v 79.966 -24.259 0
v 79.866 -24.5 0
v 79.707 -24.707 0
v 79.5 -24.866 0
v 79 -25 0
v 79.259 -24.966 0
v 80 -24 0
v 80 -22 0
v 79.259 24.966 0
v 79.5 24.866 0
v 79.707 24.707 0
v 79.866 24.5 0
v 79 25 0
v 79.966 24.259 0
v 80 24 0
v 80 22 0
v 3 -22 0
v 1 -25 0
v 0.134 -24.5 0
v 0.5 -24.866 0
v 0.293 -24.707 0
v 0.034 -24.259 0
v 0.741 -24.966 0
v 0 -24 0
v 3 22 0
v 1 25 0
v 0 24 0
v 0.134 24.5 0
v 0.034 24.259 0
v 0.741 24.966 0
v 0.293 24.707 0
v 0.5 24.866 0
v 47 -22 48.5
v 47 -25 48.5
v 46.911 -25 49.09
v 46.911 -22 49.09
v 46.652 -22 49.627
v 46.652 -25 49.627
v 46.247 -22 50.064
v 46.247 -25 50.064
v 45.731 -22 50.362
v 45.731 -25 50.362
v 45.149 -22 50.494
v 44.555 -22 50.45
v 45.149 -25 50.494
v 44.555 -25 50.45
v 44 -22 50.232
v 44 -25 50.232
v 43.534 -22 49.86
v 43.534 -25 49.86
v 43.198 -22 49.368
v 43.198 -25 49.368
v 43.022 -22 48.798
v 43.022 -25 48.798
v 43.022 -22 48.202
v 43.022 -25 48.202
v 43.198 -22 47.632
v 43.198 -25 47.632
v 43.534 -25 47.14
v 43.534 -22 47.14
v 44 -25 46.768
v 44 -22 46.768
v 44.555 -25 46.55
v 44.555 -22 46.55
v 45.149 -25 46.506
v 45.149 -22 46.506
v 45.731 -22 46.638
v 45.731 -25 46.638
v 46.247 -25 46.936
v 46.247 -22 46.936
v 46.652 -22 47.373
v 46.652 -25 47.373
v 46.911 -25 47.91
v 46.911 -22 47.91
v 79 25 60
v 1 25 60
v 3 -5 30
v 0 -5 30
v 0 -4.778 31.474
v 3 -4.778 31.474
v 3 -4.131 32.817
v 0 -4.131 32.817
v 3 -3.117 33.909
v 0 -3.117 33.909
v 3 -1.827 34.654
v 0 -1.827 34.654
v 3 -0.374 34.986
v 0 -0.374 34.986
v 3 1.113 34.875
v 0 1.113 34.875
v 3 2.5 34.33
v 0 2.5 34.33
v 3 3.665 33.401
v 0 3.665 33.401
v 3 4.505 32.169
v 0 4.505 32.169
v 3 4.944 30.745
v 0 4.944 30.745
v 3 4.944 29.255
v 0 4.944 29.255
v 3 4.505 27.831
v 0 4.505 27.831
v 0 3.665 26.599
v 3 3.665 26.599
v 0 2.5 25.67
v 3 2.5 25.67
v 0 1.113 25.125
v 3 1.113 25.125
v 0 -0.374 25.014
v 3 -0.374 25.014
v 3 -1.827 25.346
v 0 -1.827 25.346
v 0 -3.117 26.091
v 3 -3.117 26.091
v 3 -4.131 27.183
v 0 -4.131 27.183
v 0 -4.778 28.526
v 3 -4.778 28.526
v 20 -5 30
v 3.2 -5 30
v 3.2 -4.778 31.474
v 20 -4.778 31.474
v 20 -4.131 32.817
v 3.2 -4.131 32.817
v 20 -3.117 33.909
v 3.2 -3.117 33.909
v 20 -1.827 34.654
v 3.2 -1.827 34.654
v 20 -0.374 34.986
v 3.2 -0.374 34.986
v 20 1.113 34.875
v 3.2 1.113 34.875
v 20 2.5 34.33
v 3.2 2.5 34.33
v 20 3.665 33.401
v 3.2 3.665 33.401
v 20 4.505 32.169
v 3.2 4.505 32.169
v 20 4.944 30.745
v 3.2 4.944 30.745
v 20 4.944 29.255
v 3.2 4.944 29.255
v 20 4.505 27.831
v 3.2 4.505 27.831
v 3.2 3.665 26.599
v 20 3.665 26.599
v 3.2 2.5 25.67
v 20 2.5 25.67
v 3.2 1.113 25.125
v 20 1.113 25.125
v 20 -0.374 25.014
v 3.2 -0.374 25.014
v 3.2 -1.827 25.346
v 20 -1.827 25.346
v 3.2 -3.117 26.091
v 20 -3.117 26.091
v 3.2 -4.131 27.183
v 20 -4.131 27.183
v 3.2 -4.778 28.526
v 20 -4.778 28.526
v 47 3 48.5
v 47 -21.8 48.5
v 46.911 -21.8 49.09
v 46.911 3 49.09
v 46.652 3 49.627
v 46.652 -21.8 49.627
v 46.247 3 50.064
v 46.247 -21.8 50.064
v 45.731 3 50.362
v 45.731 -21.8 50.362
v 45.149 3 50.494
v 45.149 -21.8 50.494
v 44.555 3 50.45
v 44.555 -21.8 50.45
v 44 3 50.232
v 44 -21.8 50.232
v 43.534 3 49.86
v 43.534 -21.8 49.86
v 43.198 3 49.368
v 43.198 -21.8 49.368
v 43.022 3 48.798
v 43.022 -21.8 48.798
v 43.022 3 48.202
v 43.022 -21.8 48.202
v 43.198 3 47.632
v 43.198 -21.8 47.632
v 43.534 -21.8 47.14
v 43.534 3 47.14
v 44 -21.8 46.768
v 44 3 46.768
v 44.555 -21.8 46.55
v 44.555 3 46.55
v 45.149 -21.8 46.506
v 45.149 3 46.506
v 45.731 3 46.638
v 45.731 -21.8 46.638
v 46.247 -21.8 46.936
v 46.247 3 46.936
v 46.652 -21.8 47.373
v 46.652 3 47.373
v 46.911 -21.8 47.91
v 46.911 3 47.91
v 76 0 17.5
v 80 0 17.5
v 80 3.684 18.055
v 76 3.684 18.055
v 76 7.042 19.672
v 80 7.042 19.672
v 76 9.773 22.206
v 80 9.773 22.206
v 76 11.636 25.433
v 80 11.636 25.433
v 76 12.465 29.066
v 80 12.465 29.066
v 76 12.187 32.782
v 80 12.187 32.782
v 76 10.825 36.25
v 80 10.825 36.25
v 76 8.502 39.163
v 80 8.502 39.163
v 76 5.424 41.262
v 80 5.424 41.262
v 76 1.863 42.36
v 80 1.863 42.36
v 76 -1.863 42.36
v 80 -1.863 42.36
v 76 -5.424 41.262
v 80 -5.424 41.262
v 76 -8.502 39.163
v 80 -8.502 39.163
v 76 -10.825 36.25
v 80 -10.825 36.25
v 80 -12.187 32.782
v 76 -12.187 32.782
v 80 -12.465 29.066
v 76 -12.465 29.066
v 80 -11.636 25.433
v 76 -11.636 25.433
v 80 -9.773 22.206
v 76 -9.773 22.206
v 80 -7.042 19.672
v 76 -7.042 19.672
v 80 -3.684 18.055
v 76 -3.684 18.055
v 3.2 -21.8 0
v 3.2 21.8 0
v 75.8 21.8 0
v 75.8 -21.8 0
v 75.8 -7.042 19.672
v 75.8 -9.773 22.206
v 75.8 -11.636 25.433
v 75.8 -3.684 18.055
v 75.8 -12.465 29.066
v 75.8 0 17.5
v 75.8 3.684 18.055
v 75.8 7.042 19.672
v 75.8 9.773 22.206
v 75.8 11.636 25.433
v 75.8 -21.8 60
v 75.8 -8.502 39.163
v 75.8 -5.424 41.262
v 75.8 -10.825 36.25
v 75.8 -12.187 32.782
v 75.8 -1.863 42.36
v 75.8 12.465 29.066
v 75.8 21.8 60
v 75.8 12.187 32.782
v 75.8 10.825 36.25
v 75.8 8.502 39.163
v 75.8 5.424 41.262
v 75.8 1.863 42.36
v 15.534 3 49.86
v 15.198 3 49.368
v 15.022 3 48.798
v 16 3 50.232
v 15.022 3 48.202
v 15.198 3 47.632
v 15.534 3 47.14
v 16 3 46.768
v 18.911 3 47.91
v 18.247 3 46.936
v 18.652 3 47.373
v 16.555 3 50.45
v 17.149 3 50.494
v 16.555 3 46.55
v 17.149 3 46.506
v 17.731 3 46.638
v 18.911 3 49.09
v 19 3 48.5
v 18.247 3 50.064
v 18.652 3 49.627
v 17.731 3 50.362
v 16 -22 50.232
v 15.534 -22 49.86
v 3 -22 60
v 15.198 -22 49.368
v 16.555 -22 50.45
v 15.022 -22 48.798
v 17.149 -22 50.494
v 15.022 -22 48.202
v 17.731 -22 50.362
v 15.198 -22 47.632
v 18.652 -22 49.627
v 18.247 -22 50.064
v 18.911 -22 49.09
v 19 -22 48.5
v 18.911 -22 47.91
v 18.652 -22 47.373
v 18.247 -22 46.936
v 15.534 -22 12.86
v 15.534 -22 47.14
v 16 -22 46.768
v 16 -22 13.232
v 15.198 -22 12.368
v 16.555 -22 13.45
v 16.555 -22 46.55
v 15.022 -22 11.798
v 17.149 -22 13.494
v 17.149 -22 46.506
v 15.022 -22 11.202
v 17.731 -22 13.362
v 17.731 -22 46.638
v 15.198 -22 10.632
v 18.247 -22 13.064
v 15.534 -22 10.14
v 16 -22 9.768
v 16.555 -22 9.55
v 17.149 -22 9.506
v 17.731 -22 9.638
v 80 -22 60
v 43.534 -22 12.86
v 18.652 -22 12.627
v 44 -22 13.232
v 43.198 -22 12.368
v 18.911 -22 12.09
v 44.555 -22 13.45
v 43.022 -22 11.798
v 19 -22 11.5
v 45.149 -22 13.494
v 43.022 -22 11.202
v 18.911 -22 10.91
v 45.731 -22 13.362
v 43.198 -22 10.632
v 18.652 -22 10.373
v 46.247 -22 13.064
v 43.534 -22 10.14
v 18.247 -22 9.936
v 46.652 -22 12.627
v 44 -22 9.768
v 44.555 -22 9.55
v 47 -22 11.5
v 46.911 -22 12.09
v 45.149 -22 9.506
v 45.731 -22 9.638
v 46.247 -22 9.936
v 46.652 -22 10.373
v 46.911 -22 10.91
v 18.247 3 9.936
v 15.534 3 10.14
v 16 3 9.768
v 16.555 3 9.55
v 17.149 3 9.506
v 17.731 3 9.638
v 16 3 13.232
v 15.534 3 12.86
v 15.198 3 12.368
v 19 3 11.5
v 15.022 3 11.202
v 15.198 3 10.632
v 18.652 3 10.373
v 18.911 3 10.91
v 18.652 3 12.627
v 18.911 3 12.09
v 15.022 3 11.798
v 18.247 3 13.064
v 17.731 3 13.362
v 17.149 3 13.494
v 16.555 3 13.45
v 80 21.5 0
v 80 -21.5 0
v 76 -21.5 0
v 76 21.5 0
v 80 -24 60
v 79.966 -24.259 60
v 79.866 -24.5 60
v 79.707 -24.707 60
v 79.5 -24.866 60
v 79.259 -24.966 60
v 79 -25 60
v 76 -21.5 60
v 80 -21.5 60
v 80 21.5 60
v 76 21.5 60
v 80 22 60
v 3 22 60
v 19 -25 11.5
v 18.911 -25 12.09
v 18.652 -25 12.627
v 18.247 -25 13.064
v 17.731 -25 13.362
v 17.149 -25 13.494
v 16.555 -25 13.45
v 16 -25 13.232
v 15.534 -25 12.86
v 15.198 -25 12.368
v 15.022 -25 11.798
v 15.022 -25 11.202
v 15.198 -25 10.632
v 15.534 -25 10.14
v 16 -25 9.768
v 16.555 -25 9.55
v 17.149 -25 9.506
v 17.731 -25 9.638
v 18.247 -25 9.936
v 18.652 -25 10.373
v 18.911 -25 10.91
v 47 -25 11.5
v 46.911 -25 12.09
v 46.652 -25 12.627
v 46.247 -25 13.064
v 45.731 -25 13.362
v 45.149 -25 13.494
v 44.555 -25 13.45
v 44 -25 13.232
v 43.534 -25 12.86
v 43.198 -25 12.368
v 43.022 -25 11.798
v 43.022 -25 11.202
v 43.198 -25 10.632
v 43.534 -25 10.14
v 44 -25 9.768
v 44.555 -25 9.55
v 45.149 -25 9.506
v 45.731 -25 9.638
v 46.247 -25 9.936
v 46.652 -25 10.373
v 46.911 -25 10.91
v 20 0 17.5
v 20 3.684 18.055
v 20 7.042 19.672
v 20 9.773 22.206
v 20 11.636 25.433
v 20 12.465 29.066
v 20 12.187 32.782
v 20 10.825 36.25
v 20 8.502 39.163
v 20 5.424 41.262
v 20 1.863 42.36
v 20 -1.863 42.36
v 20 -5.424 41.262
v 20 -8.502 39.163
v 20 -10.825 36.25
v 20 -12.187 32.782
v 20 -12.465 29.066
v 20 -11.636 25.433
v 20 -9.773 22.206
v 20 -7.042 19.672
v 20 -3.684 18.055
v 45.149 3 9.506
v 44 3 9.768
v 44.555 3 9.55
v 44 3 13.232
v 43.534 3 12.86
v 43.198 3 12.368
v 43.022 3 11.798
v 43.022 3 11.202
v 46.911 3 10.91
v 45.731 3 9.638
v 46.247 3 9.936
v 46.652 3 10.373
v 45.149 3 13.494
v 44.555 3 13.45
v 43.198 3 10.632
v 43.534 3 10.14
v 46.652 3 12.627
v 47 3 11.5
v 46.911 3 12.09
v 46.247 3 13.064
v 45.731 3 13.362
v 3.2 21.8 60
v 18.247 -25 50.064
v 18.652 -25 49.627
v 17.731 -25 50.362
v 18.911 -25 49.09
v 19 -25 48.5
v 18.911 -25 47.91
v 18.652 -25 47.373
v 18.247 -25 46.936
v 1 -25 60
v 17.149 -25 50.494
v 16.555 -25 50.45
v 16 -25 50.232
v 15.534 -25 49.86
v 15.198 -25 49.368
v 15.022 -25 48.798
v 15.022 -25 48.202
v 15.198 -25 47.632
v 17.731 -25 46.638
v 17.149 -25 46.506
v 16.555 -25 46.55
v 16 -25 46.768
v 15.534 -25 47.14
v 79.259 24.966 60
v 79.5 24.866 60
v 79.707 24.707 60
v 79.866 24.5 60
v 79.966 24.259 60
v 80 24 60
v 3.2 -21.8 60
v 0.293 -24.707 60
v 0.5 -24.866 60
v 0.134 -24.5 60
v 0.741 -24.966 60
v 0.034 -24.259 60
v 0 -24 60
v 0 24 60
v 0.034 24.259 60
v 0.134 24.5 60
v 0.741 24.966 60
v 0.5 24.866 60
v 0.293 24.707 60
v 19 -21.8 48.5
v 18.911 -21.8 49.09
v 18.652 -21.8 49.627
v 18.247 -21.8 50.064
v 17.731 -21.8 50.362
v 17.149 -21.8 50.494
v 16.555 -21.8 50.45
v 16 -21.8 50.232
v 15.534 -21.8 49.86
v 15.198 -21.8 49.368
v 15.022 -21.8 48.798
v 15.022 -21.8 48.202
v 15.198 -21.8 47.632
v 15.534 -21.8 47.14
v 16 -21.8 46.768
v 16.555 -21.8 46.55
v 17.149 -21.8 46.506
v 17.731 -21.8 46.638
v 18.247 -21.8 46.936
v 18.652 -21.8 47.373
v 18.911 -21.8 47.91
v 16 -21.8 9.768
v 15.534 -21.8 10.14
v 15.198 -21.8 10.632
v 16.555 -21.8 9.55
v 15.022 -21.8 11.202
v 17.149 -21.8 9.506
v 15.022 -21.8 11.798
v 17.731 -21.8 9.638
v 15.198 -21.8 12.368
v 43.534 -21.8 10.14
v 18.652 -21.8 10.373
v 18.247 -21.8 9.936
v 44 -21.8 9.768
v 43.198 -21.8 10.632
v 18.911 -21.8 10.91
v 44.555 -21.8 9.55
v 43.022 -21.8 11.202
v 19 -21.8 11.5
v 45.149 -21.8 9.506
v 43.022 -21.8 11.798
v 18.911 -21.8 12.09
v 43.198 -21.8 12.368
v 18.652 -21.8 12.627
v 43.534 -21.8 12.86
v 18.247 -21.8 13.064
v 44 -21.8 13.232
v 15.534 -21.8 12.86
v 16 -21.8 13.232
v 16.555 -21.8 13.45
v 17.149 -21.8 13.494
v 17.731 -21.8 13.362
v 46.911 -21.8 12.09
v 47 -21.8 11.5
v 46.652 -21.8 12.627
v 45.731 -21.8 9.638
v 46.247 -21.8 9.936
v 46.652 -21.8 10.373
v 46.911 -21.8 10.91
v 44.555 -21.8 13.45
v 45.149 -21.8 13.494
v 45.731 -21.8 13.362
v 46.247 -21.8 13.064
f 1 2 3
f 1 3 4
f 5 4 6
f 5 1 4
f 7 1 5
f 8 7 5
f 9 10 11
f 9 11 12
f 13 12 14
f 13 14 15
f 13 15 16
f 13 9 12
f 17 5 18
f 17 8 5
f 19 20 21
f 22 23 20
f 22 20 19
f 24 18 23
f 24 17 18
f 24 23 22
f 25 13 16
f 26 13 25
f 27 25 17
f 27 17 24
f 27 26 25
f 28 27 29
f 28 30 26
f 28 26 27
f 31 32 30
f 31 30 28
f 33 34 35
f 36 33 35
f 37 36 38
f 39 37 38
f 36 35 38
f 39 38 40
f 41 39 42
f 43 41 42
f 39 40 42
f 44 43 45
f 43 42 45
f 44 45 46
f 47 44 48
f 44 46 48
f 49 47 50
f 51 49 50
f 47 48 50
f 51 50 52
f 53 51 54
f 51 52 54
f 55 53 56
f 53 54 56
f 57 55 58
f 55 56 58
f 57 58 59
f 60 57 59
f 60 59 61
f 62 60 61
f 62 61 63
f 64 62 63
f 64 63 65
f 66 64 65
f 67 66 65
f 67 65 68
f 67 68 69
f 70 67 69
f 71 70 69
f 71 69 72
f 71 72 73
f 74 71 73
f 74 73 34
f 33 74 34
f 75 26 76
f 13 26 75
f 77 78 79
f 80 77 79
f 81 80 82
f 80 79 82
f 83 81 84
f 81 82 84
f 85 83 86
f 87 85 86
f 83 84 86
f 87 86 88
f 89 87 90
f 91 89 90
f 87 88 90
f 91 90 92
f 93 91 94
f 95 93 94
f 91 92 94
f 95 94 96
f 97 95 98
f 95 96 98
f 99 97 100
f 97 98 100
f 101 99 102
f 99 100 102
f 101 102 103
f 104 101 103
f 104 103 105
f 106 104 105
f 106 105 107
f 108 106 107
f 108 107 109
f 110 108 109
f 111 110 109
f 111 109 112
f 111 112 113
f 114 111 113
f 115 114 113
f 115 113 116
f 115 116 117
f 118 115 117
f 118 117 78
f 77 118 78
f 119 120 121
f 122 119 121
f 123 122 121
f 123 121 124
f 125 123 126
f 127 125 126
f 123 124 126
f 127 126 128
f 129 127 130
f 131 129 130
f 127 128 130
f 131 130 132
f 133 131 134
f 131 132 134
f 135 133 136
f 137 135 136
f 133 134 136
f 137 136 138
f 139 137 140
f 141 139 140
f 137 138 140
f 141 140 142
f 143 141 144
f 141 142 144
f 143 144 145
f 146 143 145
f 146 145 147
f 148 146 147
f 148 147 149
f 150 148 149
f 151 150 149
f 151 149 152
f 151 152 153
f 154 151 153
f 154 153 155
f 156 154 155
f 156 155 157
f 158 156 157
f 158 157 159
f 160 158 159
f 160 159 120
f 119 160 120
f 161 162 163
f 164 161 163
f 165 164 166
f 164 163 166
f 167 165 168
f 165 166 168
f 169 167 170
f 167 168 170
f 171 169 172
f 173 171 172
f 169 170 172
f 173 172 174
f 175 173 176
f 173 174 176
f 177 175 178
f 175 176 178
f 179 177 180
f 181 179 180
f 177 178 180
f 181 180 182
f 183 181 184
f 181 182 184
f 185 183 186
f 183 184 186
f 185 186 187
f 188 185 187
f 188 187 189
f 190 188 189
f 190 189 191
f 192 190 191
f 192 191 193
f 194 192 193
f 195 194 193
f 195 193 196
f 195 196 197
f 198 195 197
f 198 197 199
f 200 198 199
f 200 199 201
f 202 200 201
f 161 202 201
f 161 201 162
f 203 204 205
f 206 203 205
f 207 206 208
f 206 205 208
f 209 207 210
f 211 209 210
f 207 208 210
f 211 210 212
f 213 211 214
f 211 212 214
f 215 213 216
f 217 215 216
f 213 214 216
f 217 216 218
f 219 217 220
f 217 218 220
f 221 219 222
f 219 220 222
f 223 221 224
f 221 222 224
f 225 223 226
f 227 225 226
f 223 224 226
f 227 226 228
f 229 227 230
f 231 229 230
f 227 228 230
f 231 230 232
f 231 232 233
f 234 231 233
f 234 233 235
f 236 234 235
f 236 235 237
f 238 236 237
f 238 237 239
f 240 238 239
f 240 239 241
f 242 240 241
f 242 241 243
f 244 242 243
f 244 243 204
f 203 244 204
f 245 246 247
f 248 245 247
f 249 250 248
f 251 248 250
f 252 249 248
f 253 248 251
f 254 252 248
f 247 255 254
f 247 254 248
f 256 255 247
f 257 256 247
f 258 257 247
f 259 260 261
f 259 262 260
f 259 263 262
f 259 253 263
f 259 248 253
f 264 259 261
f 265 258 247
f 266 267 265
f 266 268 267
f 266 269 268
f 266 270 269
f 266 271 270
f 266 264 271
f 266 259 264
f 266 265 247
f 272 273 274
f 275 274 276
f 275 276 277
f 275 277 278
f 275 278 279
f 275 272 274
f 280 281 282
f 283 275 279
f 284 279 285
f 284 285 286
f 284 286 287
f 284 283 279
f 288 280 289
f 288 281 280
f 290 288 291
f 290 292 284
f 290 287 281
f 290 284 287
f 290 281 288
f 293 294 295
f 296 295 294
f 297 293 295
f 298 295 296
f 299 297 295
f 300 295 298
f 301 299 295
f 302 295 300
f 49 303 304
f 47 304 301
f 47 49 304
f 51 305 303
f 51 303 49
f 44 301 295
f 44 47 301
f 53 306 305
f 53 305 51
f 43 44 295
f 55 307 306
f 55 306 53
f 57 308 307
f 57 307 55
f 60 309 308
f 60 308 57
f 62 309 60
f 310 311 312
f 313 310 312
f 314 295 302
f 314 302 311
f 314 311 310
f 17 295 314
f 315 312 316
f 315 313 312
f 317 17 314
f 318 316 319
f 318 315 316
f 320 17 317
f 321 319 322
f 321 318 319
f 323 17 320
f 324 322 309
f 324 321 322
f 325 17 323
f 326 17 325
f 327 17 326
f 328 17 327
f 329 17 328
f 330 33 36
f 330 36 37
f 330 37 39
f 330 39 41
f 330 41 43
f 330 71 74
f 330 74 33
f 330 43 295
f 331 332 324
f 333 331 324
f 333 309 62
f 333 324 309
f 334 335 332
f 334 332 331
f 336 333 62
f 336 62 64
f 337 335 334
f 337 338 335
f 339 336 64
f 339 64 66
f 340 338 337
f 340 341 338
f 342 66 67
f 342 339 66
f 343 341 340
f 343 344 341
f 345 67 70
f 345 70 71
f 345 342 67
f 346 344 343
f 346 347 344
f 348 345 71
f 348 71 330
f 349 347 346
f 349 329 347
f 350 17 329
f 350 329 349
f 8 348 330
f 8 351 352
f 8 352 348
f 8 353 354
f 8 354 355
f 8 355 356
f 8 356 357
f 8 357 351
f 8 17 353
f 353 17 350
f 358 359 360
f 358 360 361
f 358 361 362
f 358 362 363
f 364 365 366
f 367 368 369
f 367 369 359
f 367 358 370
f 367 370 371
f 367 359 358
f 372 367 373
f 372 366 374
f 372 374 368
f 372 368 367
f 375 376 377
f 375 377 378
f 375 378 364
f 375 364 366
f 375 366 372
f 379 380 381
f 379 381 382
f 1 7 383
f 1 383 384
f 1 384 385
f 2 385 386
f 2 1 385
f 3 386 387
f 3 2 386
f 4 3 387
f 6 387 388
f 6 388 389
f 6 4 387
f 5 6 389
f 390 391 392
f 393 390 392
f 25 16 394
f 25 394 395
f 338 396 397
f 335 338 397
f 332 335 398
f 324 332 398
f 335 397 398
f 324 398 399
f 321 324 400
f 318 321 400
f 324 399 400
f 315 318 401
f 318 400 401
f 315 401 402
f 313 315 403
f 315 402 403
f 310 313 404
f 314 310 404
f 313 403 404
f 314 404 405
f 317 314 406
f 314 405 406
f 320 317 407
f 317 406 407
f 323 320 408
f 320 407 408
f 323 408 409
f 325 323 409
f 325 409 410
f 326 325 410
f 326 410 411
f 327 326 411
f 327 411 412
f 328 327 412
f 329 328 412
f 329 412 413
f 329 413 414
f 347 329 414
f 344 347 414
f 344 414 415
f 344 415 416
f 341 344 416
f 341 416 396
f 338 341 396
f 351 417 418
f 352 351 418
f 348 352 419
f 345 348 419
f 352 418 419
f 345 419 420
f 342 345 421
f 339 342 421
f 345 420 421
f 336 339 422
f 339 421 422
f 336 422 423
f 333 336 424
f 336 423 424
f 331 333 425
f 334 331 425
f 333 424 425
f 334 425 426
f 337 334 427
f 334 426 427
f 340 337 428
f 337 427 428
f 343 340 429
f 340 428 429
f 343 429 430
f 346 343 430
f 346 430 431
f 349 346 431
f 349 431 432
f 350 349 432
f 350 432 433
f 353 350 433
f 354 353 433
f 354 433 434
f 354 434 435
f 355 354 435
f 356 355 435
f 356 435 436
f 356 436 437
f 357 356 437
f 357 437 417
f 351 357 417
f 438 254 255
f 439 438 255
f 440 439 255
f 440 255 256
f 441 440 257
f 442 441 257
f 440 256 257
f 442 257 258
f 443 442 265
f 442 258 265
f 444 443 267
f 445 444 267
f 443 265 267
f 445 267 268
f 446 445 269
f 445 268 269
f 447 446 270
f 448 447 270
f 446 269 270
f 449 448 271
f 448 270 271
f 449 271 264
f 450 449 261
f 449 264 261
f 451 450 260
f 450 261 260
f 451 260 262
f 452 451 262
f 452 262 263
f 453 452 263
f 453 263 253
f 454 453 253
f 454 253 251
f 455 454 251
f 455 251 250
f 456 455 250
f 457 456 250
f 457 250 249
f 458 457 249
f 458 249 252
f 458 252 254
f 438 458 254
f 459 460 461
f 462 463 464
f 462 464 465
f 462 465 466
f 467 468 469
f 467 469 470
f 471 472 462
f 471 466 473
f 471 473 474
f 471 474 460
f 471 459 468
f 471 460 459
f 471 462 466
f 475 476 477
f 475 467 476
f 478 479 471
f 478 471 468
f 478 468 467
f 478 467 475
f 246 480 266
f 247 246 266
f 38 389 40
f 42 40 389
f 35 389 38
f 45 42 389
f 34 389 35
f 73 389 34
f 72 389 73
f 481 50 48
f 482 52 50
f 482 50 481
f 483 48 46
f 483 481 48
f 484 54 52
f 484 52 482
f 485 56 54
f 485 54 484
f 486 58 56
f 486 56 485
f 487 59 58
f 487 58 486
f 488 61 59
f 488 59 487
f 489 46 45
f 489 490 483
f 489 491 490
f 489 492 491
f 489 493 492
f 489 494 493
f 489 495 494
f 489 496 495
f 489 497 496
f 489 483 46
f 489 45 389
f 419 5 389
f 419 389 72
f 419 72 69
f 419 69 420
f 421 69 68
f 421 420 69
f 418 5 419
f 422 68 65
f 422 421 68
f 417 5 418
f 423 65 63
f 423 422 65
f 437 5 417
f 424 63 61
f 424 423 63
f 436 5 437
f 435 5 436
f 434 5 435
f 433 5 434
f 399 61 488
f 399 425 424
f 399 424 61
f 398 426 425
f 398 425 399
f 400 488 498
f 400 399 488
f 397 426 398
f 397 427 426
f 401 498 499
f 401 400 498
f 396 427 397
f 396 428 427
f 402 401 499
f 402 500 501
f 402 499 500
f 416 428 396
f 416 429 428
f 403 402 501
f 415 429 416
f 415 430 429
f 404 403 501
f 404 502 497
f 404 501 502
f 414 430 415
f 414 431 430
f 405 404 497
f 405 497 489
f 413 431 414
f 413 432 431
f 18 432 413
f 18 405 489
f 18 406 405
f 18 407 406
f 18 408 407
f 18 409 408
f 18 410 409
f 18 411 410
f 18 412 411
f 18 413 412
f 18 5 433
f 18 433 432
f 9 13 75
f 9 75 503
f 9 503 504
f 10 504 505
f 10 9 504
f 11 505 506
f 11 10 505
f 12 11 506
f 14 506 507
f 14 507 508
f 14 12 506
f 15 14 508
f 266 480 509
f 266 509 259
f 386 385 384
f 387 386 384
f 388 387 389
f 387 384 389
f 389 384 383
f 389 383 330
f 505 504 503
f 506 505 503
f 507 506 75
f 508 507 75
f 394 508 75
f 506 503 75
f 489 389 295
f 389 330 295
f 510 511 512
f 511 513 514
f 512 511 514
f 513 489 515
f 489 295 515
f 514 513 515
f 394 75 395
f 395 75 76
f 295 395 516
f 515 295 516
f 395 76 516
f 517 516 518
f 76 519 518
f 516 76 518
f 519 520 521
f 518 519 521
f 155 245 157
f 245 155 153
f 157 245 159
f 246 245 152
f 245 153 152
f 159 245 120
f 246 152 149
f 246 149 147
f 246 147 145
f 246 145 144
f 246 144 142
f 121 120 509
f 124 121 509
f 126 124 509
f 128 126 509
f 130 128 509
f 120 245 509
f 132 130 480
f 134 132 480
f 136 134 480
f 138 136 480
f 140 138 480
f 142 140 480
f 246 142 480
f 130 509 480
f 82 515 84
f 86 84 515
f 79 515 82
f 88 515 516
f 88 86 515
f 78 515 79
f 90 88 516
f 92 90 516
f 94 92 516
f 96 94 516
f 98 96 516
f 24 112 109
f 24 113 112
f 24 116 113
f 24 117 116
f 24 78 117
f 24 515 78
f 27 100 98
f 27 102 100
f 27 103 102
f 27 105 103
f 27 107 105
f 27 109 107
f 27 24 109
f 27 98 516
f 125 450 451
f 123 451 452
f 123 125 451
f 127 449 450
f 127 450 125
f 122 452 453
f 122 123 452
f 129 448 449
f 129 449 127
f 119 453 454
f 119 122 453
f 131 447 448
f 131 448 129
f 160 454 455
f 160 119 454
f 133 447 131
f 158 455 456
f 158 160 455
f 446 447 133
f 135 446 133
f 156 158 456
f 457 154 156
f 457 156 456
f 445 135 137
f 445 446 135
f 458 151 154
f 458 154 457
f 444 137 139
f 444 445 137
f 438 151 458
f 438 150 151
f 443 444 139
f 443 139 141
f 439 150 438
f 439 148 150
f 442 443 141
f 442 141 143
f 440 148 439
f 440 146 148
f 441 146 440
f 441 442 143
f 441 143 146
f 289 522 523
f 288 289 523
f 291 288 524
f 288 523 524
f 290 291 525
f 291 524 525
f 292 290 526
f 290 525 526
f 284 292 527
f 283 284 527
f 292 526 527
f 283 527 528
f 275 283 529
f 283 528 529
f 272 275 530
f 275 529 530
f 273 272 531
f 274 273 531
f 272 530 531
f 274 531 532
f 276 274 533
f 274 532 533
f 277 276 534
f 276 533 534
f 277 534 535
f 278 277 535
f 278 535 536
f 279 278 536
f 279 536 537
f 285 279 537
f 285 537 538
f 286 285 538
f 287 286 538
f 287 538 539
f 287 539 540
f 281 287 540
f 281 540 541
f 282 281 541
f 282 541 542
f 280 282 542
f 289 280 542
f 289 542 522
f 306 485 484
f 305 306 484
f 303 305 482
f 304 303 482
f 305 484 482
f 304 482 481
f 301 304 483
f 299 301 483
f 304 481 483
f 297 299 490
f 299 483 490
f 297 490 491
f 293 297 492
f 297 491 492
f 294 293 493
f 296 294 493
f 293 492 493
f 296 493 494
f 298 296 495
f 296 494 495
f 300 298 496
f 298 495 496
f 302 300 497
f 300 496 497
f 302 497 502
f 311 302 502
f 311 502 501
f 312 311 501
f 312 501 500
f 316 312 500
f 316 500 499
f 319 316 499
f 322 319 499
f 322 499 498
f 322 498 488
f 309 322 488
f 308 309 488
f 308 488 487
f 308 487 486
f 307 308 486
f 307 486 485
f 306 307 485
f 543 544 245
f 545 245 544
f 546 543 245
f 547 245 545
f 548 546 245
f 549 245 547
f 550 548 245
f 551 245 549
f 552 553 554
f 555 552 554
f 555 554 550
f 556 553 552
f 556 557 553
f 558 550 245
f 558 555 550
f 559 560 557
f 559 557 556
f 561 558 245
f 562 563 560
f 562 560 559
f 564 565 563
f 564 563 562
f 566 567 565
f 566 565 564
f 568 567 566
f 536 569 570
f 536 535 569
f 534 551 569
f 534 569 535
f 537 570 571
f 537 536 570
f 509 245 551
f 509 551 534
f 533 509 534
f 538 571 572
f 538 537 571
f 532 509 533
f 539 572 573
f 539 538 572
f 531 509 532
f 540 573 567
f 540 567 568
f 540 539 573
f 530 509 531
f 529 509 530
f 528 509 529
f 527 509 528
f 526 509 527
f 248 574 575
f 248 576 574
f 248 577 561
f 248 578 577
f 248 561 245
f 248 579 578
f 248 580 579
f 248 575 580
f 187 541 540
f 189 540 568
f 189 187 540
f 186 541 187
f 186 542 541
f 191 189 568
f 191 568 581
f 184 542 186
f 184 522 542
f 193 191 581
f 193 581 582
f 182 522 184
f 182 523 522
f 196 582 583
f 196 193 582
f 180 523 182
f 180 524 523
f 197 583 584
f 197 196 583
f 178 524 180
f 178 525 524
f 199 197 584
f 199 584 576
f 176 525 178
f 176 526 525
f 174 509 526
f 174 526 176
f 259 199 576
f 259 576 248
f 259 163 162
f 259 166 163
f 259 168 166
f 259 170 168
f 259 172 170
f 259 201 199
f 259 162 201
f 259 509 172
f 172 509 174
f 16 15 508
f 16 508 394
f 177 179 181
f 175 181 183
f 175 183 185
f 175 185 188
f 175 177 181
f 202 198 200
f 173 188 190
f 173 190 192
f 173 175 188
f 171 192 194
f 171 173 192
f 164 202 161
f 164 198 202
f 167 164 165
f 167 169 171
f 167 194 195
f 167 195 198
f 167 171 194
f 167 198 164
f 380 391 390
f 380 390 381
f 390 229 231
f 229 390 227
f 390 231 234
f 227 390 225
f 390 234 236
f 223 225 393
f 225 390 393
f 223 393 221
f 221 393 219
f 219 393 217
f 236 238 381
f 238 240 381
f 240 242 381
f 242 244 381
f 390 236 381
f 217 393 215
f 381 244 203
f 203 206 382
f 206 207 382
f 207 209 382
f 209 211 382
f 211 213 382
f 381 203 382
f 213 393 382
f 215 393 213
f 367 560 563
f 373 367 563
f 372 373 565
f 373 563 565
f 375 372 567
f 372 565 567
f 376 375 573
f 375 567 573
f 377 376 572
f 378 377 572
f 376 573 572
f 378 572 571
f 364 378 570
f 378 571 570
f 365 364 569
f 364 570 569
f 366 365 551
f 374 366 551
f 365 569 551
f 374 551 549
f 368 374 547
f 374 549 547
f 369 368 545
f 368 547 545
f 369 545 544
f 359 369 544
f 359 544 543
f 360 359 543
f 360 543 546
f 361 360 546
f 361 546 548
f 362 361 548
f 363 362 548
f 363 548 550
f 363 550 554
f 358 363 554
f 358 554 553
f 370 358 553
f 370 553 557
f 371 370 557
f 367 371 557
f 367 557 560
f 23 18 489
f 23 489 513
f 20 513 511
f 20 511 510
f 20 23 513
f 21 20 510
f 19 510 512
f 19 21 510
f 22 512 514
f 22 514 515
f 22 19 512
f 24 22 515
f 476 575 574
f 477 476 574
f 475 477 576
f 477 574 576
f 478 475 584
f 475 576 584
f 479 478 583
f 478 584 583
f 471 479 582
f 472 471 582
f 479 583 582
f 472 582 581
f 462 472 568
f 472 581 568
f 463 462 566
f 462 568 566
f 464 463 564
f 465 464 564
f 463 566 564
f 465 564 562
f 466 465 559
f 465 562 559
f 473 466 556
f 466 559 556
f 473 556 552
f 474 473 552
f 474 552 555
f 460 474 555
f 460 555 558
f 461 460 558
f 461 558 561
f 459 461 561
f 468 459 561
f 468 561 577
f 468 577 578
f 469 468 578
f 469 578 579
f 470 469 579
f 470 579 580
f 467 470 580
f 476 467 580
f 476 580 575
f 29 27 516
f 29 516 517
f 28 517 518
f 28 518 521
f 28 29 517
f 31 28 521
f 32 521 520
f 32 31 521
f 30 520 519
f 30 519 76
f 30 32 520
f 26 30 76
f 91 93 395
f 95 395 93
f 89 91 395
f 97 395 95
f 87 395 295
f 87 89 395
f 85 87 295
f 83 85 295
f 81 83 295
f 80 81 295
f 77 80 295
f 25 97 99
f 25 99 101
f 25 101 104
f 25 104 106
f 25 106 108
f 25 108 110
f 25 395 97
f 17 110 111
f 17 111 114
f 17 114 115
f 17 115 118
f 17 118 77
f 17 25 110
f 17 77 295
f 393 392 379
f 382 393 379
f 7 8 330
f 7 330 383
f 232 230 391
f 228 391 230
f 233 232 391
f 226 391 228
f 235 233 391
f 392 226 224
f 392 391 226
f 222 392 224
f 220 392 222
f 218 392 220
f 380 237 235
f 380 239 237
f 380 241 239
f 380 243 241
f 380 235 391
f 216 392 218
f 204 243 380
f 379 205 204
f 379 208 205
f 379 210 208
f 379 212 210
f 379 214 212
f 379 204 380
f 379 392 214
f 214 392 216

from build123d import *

# Parameters (mm, degrees)
BOSS_EXTRUDE1_DEPTH = 60
SKETCH2_W           = 60
SKETCH2_H           = 43
BOSS_EXTRUDE2_DEPTH = 4
SKETCH3_W           = 72.6
SKETCH3_H           = 43.6
BOSS_EXTRUDE3_DEPTH = 60
SKETCH4_R           = 2
CUT_EXTRUDE1_DEPTH  = 28
SKETCH5_R           = 12.5
CUT_EXTRUDE2_DEPTH  = 60
SKETCH6_R           = 5
CUT_EXTRUDE3_DEPTH  = 42


with BuildPart() as part:
    # Sketch1 → Boss-Extrude1 (new body)
    with BuildSketch(Plane.XY):
        with BuildLine():
            Line((0, -24), (0, 24))
            ThreePointArc((0, 24), (0.292893219, 24.707106781), (1, 25))
            Line((1, 25), (79, 25))
            ThreePointArc((79, 25), (79.707106781, 24.707106781), (80, 24))
            Line((80, 24), (80, 22))
            Line((80, 22), (3, 22))
            Line((3, 22), (3, -22))
            Line((3, -22), (80, -22))
            Line((80, -22), (80, -24))
            ThreePointArc((80, -24), (79.707106781, -24.707106781), (79, -25))
            Line((79, -25), (1, -25))
            ThreePointArc((1, -25), (0.292893219, -24.707106781), (0, -24))
        make_face()
    extrude(amount=BOSS_EXTRUDE1_DEPTH)


with BuildPart() as body_2:
    # Sketch2 → Boss-Extrude2 (new body)
    with BuildSketch(Plane(origin=(80, 0, 0), x_dir=(0, 0, -1), z_dir=(1, 0, 0))):
        with Locations((-30, 0)):
            Rectangle(SKETCH2_W, SKETCH2_H)
    extrude(amount=-BOSS_EXTRUDE2_DEPTH)


with BuildPart() as body_3:
    # Sketch3 → Boss-Extrude3 (new body)
    with BuildSketch(Plane.XY.offset(60)):
        with Locations((39.5, 0)):
            Rectangle(SKETCH3_W, SKETCH3_H)
    extrude(amount=-BOSS_EXTRUDE3_DEPTH)


with BuildPart() as cut_extrude1_tool:
    # Sketch4 → Cut-Extrude1 (new body)
    with BuildSketch(Plane.XZ.offset(25)):
        with Locations((17, 48.5)):
            Circle(SKETCH4_R)
        with Locations((45, 48.5)):
            Circle(SKETCH4_R)
        with Locations((45, 11.5)):
            Circle(SKETCH4_R)
        with Locations((17, 11.5)):
            Circle(SKETCH4_R)
    extrude(amount=-CUT_EXTRUDE1_DEPTH)


with BuildPart() as part_1:
    add(part.part)

    # Cut-Extrude1: cut by cut_extrude1_tool
    add(cut_extrude1_tool.part, mode=Mode.SUBTRACT)


with BuildPart() as body_3_1:
    add(body_3.part)

    # Cut-Extrude1: cut by cut_extrude1_tool
    add(cut_extrude1_tool.part, mode=Mode.SUBTRACT)


with BuildPart() as cut_extrude2_tool:
    # Sketch5 → Cut-Extrude2 (new body)
    with BuildSketch(Plane(origin=(80, 0, 0), x_dir=(0, 0, -1), z_dir=(1, 0, 0))):
        with Locations((-30, 0)):
            Circle(SKETCH5_R)
    extrude(amount=-CUT_EXTRUDE2_DEPTH)


with BuildPart() as body_2_1:
    add(body_2.part)

    # Cut-Extrude2: cut by cut_extrude2_tool
    add(cut_extrude2_tool.part, mode=Mode.SUBTRACT)


with BuildPart() as body_3_2:
    add(body_3_1.part)

    # Cut-Extrude2: cut by cut_extrude2_tool
    add(cut_extrude2_tool.part, mode=Mode.SUBTRACT)


with BuildPart() as cut_extrude3_tool:
    # Sketch6 → Cut-Extrude3 (new body)
    with BuildSketch(Plane.ZY):
        with Locations(Location((30, 0, 0), (0, 0, 270))):
            Circle(SKETCH6_R)
    extrude(amount=-CUT_EXTRUDE3_DEPTH)


with BuildPart() as part_2:
    add(part_1.part)

    # Cut-Extrude3: cut by cut_extrude3_tool
    add(cut_extrude3_tool.part, mode=Mode.SUBTRACT)


with BuildPart() as body_3_3:
    add(body_3_2.part)

    # Cut-Extrude3: cut by cut_extrude3_tool
    add(cut_extrude3_tool.part, mode=Mode.SUBTRACT)


solid = Compound([body_2_1.part, part_2.part, body_3_3.part])
